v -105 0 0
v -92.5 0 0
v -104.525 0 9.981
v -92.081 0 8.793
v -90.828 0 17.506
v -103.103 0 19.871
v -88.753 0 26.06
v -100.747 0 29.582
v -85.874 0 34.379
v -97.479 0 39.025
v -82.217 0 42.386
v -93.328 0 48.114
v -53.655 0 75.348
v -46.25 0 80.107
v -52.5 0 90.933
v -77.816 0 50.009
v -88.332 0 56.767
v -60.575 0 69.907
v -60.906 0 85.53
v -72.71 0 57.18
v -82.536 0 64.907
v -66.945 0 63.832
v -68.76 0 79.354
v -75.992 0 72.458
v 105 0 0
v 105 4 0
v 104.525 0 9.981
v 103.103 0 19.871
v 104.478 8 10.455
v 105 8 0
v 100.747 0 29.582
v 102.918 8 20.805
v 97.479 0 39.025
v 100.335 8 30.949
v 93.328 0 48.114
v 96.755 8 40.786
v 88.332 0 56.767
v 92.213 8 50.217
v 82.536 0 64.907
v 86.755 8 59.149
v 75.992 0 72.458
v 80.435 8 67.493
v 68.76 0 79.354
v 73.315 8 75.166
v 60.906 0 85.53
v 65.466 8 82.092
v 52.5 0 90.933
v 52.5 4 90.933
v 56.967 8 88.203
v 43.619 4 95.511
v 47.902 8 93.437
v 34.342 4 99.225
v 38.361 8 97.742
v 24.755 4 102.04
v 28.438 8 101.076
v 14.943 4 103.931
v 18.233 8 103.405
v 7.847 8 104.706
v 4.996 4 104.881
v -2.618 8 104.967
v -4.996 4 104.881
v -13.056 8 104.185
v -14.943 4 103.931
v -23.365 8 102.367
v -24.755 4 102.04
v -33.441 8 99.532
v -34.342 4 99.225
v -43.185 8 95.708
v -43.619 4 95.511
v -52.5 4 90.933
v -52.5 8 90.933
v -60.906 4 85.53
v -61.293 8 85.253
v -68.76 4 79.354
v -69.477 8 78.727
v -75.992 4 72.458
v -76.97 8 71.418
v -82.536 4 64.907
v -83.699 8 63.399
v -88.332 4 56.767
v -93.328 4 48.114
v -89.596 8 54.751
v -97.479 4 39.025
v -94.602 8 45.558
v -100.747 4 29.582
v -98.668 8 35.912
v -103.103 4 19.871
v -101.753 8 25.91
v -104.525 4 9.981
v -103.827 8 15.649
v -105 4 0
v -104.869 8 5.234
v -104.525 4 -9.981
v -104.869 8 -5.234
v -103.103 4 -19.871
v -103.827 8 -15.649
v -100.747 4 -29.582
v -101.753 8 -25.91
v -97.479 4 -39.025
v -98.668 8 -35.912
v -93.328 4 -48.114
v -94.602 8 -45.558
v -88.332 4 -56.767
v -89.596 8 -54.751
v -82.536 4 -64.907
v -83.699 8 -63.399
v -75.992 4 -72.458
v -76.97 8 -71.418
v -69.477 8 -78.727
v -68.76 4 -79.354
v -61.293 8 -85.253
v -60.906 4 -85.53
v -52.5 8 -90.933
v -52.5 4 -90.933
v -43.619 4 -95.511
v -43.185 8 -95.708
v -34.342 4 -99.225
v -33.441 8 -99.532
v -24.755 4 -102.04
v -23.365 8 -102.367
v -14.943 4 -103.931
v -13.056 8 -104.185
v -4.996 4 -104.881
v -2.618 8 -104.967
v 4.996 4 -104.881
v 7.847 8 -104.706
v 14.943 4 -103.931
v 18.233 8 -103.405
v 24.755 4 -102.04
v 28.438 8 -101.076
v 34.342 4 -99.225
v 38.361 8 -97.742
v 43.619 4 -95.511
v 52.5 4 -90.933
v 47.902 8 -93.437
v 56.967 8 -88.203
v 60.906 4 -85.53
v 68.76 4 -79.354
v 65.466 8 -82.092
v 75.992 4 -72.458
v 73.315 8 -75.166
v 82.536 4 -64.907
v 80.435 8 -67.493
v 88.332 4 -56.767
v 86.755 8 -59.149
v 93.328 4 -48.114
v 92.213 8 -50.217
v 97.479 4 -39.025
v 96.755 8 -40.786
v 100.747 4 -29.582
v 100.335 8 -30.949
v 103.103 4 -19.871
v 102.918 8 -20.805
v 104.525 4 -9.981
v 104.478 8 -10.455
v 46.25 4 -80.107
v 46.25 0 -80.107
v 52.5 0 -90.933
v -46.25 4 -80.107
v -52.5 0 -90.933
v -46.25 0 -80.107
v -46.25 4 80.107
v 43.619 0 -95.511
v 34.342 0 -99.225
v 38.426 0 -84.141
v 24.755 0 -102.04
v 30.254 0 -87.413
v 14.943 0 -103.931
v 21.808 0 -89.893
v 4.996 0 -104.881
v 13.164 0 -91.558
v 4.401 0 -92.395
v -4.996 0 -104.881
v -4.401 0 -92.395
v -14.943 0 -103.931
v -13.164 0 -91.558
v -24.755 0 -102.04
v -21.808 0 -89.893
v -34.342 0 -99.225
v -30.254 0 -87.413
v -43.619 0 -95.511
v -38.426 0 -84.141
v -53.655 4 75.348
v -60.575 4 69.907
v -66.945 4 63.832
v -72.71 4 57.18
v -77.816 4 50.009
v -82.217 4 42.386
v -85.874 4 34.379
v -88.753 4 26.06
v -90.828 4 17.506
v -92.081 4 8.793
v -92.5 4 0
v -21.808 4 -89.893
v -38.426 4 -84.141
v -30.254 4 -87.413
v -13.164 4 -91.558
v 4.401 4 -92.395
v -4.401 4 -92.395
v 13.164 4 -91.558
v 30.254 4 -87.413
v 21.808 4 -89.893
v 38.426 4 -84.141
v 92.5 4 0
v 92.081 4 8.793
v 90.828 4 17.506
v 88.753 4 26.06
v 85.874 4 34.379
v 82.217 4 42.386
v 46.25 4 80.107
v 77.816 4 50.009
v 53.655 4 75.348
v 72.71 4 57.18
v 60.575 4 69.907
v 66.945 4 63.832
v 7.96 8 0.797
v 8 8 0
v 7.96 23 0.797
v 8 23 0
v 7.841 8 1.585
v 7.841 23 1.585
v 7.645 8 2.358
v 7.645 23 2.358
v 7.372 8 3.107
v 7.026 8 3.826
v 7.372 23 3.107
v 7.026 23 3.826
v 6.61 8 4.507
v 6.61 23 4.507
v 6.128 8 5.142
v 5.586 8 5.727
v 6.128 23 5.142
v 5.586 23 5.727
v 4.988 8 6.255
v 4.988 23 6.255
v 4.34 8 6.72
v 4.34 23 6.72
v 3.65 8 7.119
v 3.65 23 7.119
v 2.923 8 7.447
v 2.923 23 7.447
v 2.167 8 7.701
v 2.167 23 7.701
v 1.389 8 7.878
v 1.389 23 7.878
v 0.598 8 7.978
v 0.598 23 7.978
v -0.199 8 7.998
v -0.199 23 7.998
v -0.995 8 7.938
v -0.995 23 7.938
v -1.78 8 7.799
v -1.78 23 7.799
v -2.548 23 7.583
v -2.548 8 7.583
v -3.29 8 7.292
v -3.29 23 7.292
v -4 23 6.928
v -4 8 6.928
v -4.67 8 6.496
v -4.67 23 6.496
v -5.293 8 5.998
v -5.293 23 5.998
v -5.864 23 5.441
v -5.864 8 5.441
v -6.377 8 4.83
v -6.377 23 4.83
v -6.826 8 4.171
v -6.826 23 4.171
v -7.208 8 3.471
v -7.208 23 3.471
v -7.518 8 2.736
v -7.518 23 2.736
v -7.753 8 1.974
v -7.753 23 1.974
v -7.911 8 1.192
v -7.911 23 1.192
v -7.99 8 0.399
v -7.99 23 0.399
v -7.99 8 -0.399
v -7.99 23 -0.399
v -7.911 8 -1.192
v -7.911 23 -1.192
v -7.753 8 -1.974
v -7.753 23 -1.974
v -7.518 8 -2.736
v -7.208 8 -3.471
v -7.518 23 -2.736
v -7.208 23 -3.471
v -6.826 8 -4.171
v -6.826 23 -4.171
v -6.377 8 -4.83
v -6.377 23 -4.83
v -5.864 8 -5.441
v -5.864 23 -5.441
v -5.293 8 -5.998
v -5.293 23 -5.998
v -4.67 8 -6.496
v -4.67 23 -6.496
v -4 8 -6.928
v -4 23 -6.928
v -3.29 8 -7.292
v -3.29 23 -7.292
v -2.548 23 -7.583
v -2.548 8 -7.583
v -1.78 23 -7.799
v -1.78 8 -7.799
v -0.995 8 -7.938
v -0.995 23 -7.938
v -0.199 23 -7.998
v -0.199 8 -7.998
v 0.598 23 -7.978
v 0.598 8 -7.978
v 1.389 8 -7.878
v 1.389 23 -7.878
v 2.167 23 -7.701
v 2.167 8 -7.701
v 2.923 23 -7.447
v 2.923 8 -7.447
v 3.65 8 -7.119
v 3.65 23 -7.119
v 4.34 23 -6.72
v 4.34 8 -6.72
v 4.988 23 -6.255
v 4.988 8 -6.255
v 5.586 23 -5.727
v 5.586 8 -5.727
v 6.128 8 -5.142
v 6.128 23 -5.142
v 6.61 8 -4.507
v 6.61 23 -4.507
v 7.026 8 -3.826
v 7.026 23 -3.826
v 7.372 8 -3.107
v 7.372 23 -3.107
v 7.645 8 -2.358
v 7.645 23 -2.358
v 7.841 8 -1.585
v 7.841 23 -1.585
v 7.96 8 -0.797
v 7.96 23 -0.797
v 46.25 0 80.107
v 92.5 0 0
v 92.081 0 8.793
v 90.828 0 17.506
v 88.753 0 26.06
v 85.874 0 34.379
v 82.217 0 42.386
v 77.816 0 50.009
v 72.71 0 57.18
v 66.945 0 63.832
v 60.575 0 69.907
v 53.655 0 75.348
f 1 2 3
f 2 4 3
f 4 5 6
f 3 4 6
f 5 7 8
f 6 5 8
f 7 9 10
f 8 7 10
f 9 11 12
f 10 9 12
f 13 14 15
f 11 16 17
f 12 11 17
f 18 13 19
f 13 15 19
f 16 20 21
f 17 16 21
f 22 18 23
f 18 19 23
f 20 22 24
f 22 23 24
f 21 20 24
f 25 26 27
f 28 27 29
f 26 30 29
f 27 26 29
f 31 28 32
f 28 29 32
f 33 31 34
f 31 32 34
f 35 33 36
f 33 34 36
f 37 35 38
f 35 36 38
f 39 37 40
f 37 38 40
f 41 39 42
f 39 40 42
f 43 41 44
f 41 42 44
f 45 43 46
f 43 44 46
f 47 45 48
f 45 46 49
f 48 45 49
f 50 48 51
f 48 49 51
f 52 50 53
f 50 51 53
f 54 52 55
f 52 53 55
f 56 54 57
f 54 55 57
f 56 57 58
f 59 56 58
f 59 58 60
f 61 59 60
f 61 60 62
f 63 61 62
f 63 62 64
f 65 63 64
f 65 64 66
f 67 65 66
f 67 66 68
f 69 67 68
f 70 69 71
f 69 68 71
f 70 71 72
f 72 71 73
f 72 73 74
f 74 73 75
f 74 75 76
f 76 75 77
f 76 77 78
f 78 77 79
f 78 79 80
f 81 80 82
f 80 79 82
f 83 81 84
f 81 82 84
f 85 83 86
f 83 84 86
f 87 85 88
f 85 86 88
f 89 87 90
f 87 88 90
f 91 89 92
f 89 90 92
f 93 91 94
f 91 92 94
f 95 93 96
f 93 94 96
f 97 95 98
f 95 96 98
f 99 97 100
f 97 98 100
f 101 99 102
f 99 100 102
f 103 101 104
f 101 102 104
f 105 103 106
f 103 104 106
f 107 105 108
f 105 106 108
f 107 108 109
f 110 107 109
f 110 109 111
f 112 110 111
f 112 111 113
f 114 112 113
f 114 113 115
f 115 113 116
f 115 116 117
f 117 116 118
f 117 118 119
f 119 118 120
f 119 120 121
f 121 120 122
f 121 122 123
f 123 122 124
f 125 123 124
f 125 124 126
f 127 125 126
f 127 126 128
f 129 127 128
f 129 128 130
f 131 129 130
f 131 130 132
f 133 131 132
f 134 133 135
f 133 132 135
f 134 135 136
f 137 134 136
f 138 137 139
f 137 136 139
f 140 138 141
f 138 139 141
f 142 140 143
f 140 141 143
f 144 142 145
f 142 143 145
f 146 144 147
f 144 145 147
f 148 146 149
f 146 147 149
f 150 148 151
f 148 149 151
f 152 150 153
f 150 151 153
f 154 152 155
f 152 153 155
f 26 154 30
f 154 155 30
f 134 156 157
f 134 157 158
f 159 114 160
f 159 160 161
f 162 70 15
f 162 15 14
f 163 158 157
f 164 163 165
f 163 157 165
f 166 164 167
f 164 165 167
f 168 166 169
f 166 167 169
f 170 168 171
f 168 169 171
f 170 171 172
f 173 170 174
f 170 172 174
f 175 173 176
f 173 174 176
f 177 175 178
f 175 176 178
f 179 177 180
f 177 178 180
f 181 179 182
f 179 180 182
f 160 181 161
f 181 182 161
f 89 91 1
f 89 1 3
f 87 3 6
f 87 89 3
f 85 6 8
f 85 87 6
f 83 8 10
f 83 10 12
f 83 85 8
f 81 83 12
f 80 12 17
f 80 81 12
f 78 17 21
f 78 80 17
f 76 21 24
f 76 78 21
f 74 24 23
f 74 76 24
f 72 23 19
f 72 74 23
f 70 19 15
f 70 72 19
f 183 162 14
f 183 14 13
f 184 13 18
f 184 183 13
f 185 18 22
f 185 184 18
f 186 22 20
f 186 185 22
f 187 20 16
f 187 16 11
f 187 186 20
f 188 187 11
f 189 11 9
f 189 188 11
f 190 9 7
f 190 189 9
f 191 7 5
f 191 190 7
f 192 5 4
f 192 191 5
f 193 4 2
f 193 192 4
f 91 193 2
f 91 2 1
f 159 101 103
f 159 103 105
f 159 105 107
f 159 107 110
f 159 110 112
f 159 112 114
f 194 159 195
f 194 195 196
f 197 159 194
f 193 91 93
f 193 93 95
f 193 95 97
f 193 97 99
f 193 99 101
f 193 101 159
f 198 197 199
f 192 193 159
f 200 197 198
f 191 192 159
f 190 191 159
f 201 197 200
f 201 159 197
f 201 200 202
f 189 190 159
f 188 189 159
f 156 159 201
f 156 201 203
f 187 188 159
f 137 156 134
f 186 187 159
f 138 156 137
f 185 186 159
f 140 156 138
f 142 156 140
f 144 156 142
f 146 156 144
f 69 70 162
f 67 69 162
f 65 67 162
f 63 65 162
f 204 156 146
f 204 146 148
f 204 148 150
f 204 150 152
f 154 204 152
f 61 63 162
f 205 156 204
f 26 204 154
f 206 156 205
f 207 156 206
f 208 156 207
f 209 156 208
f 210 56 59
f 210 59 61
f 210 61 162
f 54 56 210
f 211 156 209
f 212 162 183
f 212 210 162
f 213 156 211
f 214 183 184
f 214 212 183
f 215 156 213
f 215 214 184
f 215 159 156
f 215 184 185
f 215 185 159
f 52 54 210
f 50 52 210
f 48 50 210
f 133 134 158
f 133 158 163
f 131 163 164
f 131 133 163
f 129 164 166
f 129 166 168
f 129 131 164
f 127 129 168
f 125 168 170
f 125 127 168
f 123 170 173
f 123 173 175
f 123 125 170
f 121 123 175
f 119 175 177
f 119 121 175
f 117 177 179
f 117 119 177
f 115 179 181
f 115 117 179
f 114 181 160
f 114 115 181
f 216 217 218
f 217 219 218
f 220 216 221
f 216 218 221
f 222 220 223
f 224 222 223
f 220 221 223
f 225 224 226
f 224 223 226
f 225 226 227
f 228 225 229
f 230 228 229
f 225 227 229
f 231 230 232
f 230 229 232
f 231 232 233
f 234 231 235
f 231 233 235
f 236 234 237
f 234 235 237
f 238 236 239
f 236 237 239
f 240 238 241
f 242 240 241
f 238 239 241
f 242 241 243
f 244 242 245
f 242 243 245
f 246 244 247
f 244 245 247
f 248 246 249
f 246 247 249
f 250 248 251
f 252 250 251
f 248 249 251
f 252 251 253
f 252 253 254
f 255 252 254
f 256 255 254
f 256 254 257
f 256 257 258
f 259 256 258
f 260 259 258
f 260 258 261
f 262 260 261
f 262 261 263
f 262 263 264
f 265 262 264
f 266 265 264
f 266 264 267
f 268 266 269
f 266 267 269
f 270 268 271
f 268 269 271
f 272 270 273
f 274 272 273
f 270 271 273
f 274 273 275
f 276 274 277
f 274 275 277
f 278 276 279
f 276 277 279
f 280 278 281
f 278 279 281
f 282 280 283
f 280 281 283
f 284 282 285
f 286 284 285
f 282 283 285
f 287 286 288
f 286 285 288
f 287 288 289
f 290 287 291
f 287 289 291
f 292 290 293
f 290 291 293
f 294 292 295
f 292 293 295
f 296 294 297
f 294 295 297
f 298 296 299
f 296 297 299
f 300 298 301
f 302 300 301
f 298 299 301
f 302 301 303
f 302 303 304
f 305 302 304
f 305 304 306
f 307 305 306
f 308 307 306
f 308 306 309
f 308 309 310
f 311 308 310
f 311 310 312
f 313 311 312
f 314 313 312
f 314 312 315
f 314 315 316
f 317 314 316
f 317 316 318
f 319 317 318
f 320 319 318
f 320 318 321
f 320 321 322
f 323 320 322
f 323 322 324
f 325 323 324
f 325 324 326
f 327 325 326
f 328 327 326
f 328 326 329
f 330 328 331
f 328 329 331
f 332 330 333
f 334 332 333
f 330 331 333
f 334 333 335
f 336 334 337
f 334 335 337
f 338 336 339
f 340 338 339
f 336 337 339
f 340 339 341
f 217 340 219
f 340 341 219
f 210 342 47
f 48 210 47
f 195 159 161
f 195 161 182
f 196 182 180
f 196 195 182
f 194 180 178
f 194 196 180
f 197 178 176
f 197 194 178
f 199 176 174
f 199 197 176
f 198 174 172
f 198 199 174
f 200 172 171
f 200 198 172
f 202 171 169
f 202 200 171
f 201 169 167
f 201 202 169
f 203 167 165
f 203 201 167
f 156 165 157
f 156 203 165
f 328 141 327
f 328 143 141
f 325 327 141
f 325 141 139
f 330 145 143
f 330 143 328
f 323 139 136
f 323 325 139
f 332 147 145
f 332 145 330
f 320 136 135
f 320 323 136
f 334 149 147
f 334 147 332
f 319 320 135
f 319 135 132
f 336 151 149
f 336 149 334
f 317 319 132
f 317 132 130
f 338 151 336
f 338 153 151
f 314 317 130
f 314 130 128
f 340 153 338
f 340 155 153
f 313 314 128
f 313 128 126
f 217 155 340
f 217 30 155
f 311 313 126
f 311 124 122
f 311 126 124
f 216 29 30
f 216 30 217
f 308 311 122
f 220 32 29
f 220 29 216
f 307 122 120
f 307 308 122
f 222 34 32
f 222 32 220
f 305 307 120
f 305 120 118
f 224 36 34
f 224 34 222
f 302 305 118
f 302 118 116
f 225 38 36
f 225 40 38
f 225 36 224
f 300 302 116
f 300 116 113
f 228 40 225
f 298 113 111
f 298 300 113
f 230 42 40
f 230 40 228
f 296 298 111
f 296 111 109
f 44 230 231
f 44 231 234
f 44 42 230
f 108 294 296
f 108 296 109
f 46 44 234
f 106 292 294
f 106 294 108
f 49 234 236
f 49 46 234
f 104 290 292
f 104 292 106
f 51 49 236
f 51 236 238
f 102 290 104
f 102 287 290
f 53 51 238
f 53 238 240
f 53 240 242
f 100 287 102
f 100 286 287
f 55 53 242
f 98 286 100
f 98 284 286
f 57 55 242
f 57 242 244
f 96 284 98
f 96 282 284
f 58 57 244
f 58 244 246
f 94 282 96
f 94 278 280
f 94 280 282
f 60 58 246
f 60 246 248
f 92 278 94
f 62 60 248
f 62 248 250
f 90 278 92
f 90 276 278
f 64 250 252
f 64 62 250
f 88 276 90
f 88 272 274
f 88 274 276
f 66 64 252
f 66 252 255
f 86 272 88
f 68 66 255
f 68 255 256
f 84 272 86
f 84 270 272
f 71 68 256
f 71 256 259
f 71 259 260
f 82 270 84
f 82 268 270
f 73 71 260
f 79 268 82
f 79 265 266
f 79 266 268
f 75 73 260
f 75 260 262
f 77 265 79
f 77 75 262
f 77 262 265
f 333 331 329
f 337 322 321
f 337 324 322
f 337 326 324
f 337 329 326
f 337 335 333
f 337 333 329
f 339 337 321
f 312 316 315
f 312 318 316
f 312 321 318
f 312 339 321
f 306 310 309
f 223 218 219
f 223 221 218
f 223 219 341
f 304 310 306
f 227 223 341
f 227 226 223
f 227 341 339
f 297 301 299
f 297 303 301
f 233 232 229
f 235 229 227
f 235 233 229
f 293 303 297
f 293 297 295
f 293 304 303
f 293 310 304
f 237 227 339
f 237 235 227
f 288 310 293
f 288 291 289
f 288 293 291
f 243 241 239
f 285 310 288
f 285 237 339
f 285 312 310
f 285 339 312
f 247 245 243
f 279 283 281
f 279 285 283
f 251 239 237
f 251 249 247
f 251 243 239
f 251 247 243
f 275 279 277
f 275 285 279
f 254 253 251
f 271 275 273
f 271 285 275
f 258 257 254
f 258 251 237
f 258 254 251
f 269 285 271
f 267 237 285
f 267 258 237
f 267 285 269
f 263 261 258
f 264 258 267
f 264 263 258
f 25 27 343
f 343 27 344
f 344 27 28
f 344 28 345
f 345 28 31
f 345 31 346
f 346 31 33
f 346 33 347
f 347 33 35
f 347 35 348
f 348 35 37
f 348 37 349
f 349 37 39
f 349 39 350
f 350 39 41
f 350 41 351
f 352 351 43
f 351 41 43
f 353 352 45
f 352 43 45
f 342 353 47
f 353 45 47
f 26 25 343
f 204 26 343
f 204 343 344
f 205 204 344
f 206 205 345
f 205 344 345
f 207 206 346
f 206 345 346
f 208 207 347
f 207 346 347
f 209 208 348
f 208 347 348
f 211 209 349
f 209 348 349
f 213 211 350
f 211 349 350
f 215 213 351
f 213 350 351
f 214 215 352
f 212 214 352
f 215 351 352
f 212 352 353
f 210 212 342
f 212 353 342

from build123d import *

# Parameters (mm, degrees)
SKETCH1_W           = 105
SKETCH1_H           = 8
CUT_EXTRUDE1_DEPTH  = 4
BOSS_EXTRUDE1_DEPTH = 4
BOSS_EXTRUDE2_DEPTH = 4
SKETCH5_W           = 8
SKETCH5_H           = 15


with BuildPart() as part:
    # Sketch1 → Revolve1 (revolve)
    with BuildSketch(Plane.XY):
        with Locations((52.5, 4)):
            Rectangle(SKETCH1_W, SKETCH1_H)
    revolve(axis=Axis((0, 8, 0), (0, -1, 0)))

    # Sketch2 → Cut-Extrude1 (cut)
    with BuildSketch(Plane.XZ):
        with BuildLine():
            Line((46.25, 80.10734985), (52.5, 90.932667397))
            ThreePointArc((52.5, 90.932667397), (-90.932667397, -52.5), (105, 0))
            Line((105, 0), (92.5, 0))
            ThreePointArc((92.5, 0), (80.10734985, 46.25), (46.25, 80.10734985))
        make_face()
    extrude(amount=-CUT_EXTRUDE1_DEPTH, mode=Mode.SUBTRACT)

    # Sketch3 → Boss-Extrude1 (add)
    with BuildSketch(Plane.XZ.offset(-4)):
        with BuildLine():
            Line((-92.5, 0), (-105, 0))
            ThreePointArc((-105, 0), (-90.932667397, 52.5), (-52.5, 90.932667397))
            Line((-52.5, 90.932667397), (-46.25, 80.10734985))
            ThreePointArc((-46.25, 80.10734985), (-80.10734985, 46.25), (-92.5, 0))
        make_face()
    extrude(amount=BOSS_EXTRUDE1_DEPTH)

    # Sketch4 → Boss-Extrude2 (add)
    with BuildSketch(Plane.XZ.offset(-4)):
        with BuildLine():
            Line((-52.5, -90.932667397), (-46.25, -80.10734985))
            ThreePointArc((-46.25, -80.10734985), (0, -92.5), (46.25, -80.10734985))
            Line((46.25, -80.10734985), (52.5, -90.932667397))
            ThreePointArc((52.5, -90.932667397), (0, -105), (-52.5, -90.932667397))
        make_face()
    extrude(amount=BOSS_EXTRUDE2_DEPTH)

    # Sketch5 → Revolve2 (revolve)
    with BuildSketch(Plane.XY):
        with Locations((4, 15.5)):
            Rectangle(SKETCH5_W, SKETCH5_H)
    revolve(axis=Axis((0, 23, 0), (0, -1, 0)))


solid = part.part
